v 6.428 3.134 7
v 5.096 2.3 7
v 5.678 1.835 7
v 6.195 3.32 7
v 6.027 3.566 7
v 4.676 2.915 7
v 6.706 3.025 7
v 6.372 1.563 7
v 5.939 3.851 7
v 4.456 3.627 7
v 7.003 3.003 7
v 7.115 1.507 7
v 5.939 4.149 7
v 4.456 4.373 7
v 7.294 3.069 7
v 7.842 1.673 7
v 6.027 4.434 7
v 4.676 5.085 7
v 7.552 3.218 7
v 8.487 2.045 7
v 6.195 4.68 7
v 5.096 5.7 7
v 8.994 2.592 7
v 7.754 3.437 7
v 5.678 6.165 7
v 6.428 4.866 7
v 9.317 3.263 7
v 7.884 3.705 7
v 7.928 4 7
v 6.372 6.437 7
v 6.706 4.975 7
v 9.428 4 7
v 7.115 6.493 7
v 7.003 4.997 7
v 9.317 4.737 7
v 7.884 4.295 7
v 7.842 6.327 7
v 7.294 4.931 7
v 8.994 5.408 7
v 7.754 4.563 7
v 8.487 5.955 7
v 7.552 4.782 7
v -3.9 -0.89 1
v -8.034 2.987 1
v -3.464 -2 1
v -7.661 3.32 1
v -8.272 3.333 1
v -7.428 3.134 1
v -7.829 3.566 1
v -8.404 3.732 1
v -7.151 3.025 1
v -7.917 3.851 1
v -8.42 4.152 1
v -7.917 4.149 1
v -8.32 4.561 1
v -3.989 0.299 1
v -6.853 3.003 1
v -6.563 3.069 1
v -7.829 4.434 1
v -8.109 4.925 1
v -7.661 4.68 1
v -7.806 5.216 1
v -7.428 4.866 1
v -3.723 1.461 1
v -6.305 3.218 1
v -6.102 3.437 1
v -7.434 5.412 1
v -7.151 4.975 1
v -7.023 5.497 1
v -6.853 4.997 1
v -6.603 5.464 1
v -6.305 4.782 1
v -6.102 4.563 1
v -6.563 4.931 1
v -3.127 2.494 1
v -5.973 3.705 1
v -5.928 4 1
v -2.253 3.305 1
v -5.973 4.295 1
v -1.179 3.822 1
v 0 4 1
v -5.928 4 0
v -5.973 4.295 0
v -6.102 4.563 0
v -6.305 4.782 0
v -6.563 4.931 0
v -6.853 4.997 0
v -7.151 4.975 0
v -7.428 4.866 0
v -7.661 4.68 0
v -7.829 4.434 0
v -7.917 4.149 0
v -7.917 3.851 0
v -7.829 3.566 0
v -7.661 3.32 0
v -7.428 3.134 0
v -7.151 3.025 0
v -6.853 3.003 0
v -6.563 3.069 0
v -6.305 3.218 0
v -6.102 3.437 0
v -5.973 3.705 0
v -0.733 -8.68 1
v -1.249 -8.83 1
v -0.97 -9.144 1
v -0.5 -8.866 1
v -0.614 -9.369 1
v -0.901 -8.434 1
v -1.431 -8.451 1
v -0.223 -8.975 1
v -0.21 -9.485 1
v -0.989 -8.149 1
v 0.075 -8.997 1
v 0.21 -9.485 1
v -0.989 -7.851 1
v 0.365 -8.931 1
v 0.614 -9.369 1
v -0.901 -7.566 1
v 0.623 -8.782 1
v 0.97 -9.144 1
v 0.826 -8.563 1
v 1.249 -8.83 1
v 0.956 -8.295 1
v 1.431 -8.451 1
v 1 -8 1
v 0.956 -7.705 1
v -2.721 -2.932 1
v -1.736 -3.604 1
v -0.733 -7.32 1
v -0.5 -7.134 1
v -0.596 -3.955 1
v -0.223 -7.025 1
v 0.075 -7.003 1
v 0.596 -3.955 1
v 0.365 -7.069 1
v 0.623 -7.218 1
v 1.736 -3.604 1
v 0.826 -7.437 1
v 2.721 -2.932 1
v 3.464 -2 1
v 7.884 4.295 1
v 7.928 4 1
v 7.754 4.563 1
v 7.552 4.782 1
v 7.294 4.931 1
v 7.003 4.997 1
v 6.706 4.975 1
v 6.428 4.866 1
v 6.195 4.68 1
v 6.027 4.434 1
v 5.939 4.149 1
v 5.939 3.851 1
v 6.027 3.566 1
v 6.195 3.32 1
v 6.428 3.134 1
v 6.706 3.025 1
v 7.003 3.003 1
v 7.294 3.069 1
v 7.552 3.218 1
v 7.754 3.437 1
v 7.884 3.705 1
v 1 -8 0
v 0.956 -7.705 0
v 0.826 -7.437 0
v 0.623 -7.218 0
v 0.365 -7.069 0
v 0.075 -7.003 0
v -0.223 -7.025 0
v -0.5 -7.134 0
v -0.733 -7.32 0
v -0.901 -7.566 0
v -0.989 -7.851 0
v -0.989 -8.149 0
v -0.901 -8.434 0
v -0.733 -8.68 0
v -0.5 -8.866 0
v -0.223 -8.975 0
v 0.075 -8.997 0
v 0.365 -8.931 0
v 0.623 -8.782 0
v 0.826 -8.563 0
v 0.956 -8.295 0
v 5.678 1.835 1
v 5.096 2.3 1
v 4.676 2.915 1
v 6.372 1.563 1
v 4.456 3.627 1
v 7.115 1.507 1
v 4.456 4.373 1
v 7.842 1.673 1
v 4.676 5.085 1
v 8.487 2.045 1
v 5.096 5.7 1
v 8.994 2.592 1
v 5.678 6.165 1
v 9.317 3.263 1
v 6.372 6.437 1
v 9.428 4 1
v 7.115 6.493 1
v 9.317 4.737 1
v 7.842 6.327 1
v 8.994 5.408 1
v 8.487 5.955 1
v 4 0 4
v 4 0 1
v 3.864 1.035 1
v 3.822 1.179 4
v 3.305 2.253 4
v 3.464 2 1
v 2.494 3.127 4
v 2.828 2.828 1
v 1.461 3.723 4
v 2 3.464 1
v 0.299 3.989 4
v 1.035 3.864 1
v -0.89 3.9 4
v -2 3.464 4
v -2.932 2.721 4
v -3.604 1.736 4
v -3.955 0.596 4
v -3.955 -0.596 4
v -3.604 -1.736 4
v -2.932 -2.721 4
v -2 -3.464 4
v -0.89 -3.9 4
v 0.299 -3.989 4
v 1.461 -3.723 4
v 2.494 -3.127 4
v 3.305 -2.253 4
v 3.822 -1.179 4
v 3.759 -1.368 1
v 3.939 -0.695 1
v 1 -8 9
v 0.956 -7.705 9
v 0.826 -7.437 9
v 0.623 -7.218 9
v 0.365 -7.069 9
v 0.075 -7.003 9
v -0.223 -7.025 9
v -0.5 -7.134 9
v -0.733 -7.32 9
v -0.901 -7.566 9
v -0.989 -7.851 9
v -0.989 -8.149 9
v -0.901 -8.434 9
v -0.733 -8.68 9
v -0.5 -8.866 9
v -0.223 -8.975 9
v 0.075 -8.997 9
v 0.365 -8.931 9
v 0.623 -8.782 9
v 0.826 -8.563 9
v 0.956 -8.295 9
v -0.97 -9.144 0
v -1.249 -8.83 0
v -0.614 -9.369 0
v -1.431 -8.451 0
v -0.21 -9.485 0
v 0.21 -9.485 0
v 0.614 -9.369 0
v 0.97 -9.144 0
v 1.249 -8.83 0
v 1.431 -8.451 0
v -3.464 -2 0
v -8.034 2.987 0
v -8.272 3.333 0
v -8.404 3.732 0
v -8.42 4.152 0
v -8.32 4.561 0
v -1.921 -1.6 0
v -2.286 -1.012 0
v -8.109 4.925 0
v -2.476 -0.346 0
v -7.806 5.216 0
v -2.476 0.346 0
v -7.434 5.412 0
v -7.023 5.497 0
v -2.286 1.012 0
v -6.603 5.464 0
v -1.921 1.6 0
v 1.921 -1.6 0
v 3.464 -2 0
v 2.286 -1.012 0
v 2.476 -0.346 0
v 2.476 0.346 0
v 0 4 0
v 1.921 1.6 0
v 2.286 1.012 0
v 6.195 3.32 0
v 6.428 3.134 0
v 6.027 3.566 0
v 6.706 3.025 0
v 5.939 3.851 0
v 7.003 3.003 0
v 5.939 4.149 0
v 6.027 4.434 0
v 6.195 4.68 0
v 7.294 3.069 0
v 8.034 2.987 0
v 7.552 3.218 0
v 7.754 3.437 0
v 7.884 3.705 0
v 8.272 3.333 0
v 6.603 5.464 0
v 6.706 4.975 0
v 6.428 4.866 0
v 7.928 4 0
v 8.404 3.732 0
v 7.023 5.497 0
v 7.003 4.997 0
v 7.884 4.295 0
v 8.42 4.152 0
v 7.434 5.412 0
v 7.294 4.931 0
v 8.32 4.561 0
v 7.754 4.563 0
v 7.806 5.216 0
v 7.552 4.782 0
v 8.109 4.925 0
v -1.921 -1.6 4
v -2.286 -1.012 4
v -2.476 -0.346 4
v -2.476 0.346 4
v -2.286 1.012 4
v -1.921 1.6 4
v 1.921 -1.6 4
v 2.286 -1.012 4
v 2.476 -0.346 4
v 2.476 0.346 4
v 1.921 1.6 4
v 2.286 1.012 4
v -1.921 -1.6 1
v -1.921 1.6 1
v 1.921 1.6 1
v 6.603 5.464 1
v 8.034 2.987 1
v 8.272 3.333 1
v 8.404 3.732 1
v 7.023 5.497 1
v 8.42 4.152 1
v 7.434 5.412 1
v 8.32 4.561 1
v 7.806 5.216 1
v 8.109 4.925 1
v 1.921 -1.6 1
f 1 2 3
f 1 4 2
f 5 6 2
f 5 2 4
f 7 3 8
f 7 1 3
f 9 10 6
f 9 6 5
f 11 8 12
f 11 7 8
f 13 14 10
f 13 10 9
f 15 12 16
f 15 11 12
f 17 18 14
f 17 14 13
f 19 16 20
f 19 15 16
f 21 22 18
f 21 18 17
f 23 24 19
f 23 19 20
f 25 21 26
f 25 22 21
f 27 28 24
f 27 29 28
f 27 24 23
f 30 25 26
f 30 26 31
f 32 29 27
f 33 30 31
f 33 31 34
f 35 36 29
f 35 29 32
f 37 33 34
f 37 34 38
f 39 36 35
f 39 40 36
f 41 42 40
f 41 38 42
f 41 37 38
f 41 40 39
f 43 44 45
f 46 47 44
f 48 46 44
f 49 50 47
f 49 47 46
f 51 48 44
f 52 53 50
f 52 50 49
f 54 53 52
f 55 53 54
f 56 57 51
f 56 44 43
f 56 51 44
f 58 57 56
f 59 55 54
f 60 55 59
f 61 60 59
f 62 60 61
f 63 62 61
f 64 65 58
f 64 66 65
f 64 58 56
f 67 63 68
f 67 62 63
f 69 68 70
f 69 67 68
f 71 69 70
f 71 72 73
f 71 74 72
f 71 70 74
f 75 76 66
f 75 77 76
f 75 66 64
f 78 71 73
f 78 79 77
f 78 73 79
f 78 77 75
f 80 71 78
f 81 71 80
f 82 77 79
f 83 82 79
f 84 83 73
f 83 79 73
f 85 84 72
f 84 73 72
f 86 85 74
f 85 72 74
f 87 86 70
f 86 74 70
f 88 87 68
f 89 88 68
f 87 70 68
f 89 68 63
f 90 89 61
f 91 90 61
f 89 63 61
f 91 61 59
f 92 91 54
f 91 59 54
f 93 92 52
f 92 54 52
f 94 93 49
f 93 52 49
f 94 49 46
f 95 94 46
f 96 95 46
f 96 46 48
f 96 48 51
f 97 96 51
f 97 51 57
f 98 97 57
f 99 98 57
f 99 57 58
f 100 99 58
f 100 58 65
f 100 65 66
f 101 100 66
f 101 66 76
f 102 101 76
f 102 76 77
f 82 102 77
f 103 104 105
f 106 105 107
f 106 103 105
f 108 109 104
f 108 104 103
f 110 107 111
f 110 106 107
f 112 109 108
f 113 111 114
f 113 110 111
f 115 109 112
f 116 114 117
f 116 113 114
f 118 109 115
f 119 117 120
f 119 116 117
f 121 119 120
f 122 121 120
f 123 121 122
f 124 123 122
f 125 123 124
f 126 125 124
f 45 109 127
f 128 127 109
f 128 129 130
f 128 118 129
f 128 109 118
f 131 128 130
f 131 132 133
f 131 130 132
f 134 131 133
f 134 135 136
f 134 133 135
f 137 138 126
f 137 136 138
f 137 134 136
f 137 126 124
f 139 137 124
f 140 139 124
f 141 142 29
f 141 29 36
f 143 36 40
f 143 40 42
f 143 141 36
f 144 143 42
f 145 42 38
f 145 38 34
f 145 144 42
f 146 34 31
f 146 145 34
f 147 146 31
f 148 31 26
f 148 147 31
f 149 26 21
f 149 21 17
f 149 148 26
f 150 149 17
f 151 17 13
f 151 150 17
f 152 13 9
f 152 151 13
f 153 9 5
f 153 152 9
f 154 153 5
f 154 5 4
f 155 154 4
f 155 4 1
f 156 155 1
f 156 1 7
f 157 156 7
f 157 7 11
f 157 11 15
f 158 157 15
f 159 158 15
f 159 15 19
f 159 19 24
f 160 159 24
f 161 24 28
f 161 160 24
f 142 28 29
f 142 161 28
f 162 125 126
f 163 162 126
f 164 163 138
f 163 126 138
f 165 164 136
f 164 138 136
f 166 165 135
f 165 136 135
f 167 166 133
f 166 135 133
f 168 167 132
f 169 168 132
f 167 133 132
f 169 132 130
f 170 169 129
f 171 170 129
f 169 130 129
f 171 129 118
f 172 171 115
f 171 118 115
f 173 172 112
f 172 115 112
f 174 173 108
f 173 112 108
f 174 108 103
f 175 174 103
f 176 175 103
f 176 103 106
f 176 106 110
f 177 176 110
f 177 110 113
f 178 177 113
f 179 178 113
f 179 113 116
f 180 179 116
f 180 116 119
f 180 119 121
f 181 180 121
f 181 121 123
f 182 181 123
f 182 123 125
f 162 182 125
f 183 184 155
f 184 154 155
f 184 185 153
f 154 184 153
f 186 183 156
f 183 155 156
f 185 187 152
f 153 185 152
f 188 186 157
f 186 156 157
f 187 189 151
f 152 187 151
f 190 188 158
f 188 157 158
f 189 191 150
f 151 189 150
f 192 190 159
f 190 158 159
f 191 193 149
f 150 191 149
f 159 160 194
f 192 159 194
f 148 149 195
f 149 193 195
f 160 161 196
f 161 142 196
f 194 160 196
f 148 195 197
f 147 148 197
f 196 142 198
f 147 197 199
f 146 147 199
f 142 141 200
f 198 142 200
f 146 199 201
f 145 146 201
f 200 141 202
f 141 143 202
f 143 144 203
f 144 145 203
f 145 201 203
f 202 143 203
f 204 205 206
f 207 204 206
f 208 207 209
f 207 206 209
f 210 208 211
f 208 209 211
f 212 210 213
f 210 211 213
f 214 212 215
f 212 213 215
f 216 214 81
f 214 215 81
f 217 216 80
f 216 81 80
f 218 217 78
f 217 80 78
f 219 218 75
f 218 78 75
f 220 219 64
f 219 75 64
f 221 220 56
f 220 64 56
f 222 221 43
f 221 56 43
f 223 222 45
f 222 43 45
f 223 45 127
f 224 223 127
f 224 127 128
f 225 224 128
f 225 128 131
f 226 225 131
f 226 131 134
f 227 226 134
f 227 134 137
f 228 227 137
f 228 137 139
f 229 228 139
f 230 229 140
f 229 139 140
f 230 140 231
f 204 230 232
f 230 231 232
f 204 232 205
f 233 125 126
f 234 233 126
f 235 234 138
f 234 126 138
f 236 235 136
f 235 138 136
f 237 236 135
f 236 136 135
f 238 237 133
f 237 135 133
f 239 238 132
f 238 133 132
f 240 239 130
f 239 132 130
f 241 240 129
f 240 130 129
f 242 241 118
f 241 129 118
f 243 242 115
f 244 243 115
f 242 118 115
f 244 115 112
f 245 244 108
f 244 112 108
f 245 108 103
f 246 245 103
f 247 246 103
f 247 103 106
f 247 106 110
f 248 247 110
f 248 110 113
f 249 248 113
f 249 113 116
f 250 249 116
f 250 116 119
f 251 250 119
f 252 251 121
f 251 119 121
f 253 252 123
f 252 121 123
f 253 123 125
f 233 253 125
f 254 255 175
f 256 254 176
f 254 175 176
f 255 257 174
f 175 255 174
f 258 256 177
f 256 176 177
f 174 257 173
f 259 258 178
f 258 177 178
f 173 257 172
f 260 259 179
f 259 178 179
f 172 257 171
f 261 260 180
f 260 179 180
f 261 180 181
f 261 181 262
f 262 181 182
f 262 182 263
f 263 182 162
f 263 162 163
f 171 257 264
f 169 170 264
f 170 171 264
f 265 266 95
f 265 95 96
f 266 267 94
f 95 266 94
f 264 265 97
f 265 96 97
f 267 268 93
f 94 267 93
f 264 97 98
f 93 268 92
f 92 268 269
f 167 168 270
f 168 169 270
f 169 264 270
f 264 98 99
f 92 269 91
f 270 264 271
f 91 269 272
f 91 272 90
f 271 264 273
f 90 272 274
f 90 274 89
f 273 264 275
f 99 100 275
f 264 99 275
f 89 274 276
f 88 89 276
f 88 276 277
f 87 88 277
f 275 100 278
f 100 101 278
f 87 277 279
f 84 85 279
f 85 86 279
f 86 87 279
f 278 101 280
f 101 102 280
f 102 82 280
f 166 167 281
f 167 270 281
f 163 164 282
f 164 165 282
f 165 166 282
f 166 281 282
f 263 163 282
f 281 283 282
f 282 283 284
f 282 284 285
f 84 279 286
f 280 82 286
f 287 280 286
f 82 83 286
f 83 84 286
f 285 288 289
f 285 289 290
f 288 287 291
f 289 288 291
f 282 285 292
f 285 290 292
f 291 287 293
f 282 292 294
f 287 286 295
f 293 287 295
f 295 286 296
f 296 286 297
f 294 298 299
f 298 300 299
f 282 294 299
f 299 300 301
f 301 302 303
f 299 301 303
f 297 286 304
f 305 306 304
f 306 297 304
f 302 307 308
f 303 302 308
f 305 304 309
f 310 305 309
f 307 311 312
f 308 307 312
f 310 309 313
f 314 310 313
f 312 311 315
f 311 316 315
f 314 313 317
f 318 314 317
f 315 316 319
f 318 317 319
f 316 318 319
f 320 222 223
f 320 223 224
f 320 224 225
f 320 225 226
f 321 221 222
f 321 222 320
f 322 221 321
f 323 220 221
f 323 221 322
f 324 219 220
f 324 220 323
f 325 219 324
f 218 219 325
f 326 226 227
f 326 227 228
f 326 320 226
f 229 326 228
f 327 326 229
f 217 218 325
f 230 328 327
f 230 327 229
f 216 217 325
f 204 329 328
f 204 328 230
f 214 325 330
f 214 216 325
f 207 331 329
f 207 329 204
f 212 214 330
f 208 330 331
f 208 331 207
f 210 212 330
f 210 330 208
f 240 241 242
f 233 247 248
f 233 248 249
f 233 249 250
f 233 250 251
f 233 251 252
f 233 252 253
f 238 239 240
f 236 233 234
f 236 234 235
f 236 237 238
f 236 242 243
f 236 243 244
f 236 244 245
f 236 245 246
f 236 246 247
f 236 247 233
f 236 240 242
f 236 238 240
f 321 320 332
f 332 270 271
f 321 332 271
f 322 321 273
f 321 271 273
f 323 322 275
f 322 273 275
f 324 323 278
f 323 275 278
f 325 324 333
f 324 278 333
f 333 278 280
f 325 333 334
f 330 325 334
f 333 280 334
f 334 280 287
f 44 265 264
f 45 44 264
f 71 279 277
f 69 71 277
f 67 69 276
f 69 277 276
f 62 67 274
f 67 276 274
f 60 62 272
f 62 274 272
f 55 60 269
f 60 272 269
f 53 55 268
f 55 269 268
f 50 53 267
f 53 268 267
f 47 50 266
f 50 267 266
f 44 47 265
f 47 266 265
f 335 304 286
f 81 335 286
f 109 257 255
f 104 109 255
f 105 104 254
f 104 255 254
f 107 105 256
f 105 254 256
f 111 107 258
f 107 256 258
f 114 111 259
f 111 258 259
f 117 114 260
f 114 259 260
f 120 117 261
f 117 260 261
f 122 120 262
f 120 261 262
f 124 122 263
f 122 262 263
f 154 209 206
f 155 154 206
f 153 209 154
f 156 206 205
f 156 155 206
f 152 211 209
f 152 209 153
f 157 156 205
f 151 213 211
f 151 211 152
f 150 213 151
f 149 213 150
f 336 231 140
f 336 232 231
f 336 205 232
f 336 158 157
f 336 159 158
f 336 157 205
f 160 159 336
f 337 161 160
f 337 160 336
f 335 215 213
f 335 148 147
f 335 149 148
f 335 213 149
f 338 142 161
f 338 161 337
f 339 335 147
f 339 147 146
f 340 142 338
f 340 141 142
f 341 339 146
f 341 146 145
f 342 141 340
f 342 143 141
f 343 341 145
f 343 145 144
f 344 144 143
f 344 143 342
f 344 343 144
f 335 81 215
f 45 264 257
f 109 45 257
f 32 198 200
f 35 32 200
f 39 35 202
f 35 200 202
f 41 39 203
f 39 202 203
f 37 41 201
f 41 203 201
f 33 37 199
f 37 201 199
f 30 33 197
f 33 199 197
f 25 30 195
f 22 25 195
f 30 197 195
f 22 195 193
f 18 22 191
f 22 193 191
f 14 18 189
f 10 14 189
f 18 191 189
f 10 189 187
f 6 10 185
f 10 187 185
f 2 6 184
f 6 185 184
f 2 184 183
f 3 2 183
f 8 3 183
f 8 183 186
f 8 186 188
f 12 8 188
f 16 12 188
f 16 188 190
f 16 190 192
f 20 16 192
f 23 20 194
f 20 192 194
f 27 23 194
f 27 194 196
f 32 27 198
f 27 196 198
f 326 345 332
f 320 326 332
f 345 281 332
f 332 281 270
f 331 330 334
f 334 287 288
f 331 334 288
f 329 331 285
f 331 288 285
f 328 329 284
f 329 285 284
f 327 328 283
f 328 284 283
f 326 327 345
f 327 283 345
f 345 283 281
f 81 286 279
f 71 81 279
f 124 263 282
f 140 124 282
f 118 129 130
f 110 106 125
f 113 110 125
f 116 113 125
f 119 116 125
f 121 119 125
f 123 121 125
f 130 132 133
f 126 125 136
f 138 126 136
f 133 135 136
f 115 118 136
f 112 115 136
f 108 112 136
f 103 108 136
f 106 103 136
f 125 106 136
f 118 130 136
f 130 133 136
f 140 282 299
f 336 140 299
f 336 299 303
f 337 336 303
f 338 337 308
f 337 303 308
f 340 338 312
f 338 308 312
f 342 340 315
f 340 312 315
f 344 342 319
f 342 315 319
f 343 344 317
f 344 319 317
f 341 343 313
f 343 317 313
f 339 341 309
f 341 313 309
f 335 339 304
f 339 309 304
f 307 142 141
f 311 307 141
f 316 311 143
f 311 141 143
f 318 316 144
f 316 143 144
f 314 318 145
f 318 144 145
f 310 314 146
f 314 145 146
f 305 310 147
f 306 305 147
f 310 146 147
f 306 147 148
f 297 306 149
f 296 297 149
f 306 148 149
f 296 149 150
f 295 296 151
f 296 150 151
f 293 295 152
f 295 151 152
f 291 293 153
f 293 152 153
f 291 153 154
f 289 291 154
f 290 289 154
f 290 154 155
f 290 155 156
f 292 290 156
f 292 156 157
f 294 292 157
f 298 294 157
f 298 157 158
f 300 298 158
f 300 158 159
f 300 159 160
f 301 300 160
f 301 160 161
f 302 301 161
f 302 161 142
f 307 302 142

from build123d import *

# Parameters (mm, degrees)
F1_DEPTH  = 1
F2_W      = 3.8418745425
F2_H      = 3.2
F3_DEPTH  = 1.001
F4_R      = 4
F5_DEPTH  = 3
F6_R      = 1
F7_DEPTH  = 1.001
F8_R      = 1
F9_DEPTH  = 8
F10_R     = 2.5
F10_R_2   = 1
F11_DEPTH = 6


with BuildPart() as f1:
    # F0 (on Top) → F1 (new body)
    with BuildSketch(Plane.XY):
        with BuildLine():
            Line((-6.1782032303, 2.7009618943), (-6.9282032303, 4))
            Line((-6.9282032303, 4), (-5.4282032303, 4))
            ThreePointArc((-5.4282032303, 4), (-5.7583444162, 4.9388452243), (-6.6034437039, 5.4644218142))
            ThreePointArc((-6.6034437039, 5.4644218142), (-8.227241336, 4.75), (-8.03404996, 2.9865390929))
            ThreePointArc((-8.03404996, 2.9865390929), (-7.1563376377, 2.517449936), (-6.1782032303, 2.7009618943))
        make_face()
        Polygon((-5.4282032303, 4), (-6.9282032303, 4), (-6.1782032303, 2.7009618943), (-3.4641016151, -2), (-0.75, -6.7009618943), (0, -8), (0.75, -6.7009618943), (3.4641016151, -2), (6.1782032303, 2.7009618943), (6.9282032303, 4), (5.4282032303, 4), (0, 4), align=None)
        with BuildLine():
            ThreePointArc((-6.6034437039, 5.4644218142), (-5.7583444162, 4.9388452243), (-5.4282032303, 4))
            Line((-5.4282032303, 4), (0, 4))
            Line((0, 4), (-6.6034437039, 5.4644218142))
        make_face()
        with BuildLine():
            Line((-3.4641016151, -2), (-6.1782032303, 2.7009618943))
            ThreePointArc((-6.1782032303, 2.7009618943), (-7.1563376377, 2.517449936), (-8.03404996, 2.9865390929))
            Line((-8.03404996, 2.9865390929), (-3.4641016151, -2))
        make_face()
        with BuildLine():
            Line((6.6034437039, 5.4644218142), (0, 4))
            Line((0, 4), (5.4282032303, 4))
            ThreePointArc((5.4282032303, 4), (5.7583444162, 4.9388452243), (6.6034437039, 5.4644218142))
        make_face()
        with BuildLine():
            Line((-0.75, -6.7009618943), (-3.4641016151, -2))
            Line((-3.4641016151, -2), (-1.4306062562, -8.4509609071))
            ThreePointArc((-1.4306062562, -8.4509609071), (-1.3979932215, -7.4562951603), (-0.75, -6.7009618943))
        make_face()
        with BuildLine():
            ThreePointArc((6.6034437039, 5.4644218142), (5.7583444162, 4.9388452243), (5.4282032303, 4))
            Line((5.4282032303, 4), (6.9282032303, 4))
            Line((6.9282032303, 4), (6.1782032303, 2.7009618943))
            ThreePointArc((6.1782032303, 2.7009618943), (7.1563376377, 2.517449936), (8.03404996, 2.9865390929))
            ThreePointArc((8.03404996, 2.9865390929), (8.227241336, 4.75), (6.6034437039, 5.4644218142))
        make_face()
        with BuildLine():
            Line((0, -8), (-0.75, -6.7009618943))
            ThreePointArc((-0.75, -6.7009618943), (-1.3979932215, -7.4562951603), (-1.4306062562, -8.4509609071))
            ThreePointArc((-1.4306062562, -8.4509609071), (0, -9.5), (1.4306062562, -8.4509609071))
            ThreePointArc((1.4306062562, -8.4509609071), (1.3979932215, -7.4562951603), (0.75, -6.7009618943))
            Line((0.75, -6.7009618943), (0, -8))
        make_face()
        with BuildLine():
            Line((3.4641016151, -2), (8.03404996, 2.9865390929))
            ThreePointArc((8.03404996, 2.9865390929), (7.1563376377, 2.517449936), (6.1782032303, 2.7009618943))
            Line((6.1782032303, 2.7009618943), (3.4641016151, -2))
        make_face()
        with BuildLine():
            ThreePointArc((0.75, -6.7009618943), (1.3979932215, -7.4562951603), (1.4306062562, -8.4509609071))
            Line((1.4306062562, -8.4509609071), (3.4641016151, -2))
            Line((3.4641016151, -2), (0.75, -6.7009618943))
        make_face()
    extrude(amount=F1_DEPTH)

    # F2 (on face) → F3 (cut, through all)
    with BuildSketch(Plane(origin=(0, 0, 0), x_dir=(1, 0, 0), z_dir=(0, 0, -1))):
        with BuildLine():
            Line((-1.9209372712, -1.6), (-1.9209372712, 1.6))
            ThreePointArc((-1.9209372712, 1.6), (-2.5, 0), (-1.9209372712, -1.6))
        make_face()
        Rectangle(F2_W, F2_H)
        with BuildLine():
            ThreePointArc((1.9209372712, -1.6), (2.5, 0), (1.9209372712, 1.6))
            Line((1.9209372712, 1.6), (1.9209372712, -1.6))
        make_face()
    extrude(amount=-F3_DEPTH, mode=Mode.SUBTRACT)

    # F4 (on face) → F5 (join)
    with BuildSketch(Plane.XY.offset(1)):
        Circle(F4_R)
        with BuildLine():
            Line((-1.9209372712, 1.6), (1.9209372712, 1.6))
            ThreePointArc((1.9209372712, 1.6), (2.5, 0), (1.9209372712, -1.6))
            Line((1.9209372712, -1.6), (-1.9209372712, -1.6))
            ThreePointArc((-1.9209372712, -1.6), (-2.5, 0), (-1.9209372712, 1.6))
        make_face(mode=Mode.SUBTRACT)
    extrude(amount=F5_DEPTH)

    # F6 (on face) → F7 (cut, through all)
    with BuildSketch(Plane.XY.offset(1)):
        with Locations((-6.9282032303, 4)):
            Circle(F6_R)
        with Locations((0, -8)):
            Circle(F6_R)
        with Locations((6.9282032303, 4)):
            Circle(F6_R)
    extrude(amount=-F7_DEPTH, mode=Mode.SUBTRACT)


with BuildPart() as f9:
    # F8 (on face) → F9 (new body)
    with BuildSketch(Plane.XY.offset(1)):
        with Locations((0, -8)):
            Circle(F8_R)
    extrude(amount=F9_DEPTH)


with BuildPart() as f11:
    # F10 (on face) → F11 (new body)
    with BuildSketch(Plane.XY.offset(1)):
        with Locations((6.9282032303, 4)):
            Circle(F10_R)
        with Locations((6.9282032303, 4)):
            Circle(F10_R_2, mode=Mode.SUBTRACT)
    extrude(amount=F11_DEPTH)


solid = Compound([f1.part, f9.part, f11.part])
